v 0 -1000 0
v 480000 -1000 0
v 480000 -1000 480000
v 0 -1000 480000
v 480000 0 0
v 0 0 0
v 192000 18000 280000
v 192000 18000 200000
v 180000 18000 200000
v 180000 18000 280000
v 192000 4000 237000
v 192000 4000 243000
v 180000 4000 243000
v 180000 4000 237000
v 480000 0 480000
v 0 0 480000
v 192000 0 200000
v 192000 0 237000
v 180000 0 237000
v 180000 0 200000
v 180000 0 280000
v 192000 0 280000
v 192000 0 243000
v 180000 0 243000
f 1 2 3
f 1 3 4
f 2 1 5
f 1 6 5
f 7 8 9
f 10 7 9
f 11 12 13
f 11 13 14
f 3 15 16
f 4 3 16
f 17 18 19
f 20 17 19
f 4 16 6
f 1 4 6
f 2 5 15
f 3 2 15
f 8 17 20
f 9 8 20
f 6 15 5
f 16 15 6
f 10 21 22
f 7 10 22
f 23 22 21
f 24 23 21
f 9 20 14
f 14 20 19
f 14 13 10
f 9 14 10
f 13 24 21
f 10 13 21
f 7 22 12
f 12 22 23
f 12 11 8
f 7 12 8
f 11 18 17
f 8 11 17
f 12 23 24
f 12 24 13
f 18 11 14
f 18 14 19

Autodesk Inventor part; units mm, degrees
ref_plane "YZ Plane" through (0, 0, 0) normal (1, 0, 0) x (0, 1, 0)
ref_plane "XZ Plane" through (0, 0, 0) normal (0, 1, 0) x (-1, 0, 0)
ref_plane "XY Plane" through (0, 0, 0) normal (0, 0, 1) x (1, 0, 0)
sketch "Boceto8" plane through (0, 0, 0) normal (0, 1, 0) x (-1, 0, 0)
  line L0 (0, 0) -> (-480000, 0)
  line L1 (-480000, 0) -> (-480000, 480000)
  line L2 (-480000, 480000) -> (0, 480000)
  line L3 (0, 480000) -> (0, 0)
  dimension "d42" = 480000
  dimension "d43" = 480000
sketch "Boceto9" plane through (0, 0, 0) normal (0, 1, 0) x (-1, 0, 0)
  line L0 (-180000, 280000) -> (-192000, 280000)
  line L1 (-192000, 280000) -> (-192000, 200000)
  line L2 (-192000, 200000) -> (-180000, 200000)
  line L3 (-180000, 200000) -> (-180000, 280000)
  line L4 (-480000, 0) -> (-480000, 480000) projected
  line L5 (0, 480000) -> (0, 0) projected
  line L6 (-480000, 480000) -> (0, 480000) projected
  line L7 (0, 0) -> (-480000, 0) projected
  line L8 (0, 240000) -> (-480000, 240000)
  dimension "d44" = 12000
  dimension "d45" = 80000
  dimension "d61" = 180000
extrude "Extrusión7" add sketch "Boceto9" along normal blind 18000 contours L3 L8 L1 L0 | L3 L2 L1 L8
sketch "Boceto10" plane through (192000, 0, 280000) normal (1, 0, 0) x (0, 0, -1)
  line L0 (37000, 4000) -> (43000, 4000)
  line L1 (43000, 4000) -> (43000, 0)
  line L2 (43000, 0) -> (37000, 0)
  line L3 (37000, 0) -> (37000, 4000)
  line L4 (80000, 0) -> (0, 0) projected
  line L5 (40000, 0) -> (40000, 18049)
  line L6 (0, 0) -> (80000, 0) projected
  point P0 (280000, 0)
  dimension "d49" = 6000
  dimension "d50" = 4000
extrude "Extrusión8" cut sketch "Boceto10" against normal through all
extrude "Extrusión9" add sketch "Boceto8" against normal blind 1000 separate body
properties part number "Edificio individual"
